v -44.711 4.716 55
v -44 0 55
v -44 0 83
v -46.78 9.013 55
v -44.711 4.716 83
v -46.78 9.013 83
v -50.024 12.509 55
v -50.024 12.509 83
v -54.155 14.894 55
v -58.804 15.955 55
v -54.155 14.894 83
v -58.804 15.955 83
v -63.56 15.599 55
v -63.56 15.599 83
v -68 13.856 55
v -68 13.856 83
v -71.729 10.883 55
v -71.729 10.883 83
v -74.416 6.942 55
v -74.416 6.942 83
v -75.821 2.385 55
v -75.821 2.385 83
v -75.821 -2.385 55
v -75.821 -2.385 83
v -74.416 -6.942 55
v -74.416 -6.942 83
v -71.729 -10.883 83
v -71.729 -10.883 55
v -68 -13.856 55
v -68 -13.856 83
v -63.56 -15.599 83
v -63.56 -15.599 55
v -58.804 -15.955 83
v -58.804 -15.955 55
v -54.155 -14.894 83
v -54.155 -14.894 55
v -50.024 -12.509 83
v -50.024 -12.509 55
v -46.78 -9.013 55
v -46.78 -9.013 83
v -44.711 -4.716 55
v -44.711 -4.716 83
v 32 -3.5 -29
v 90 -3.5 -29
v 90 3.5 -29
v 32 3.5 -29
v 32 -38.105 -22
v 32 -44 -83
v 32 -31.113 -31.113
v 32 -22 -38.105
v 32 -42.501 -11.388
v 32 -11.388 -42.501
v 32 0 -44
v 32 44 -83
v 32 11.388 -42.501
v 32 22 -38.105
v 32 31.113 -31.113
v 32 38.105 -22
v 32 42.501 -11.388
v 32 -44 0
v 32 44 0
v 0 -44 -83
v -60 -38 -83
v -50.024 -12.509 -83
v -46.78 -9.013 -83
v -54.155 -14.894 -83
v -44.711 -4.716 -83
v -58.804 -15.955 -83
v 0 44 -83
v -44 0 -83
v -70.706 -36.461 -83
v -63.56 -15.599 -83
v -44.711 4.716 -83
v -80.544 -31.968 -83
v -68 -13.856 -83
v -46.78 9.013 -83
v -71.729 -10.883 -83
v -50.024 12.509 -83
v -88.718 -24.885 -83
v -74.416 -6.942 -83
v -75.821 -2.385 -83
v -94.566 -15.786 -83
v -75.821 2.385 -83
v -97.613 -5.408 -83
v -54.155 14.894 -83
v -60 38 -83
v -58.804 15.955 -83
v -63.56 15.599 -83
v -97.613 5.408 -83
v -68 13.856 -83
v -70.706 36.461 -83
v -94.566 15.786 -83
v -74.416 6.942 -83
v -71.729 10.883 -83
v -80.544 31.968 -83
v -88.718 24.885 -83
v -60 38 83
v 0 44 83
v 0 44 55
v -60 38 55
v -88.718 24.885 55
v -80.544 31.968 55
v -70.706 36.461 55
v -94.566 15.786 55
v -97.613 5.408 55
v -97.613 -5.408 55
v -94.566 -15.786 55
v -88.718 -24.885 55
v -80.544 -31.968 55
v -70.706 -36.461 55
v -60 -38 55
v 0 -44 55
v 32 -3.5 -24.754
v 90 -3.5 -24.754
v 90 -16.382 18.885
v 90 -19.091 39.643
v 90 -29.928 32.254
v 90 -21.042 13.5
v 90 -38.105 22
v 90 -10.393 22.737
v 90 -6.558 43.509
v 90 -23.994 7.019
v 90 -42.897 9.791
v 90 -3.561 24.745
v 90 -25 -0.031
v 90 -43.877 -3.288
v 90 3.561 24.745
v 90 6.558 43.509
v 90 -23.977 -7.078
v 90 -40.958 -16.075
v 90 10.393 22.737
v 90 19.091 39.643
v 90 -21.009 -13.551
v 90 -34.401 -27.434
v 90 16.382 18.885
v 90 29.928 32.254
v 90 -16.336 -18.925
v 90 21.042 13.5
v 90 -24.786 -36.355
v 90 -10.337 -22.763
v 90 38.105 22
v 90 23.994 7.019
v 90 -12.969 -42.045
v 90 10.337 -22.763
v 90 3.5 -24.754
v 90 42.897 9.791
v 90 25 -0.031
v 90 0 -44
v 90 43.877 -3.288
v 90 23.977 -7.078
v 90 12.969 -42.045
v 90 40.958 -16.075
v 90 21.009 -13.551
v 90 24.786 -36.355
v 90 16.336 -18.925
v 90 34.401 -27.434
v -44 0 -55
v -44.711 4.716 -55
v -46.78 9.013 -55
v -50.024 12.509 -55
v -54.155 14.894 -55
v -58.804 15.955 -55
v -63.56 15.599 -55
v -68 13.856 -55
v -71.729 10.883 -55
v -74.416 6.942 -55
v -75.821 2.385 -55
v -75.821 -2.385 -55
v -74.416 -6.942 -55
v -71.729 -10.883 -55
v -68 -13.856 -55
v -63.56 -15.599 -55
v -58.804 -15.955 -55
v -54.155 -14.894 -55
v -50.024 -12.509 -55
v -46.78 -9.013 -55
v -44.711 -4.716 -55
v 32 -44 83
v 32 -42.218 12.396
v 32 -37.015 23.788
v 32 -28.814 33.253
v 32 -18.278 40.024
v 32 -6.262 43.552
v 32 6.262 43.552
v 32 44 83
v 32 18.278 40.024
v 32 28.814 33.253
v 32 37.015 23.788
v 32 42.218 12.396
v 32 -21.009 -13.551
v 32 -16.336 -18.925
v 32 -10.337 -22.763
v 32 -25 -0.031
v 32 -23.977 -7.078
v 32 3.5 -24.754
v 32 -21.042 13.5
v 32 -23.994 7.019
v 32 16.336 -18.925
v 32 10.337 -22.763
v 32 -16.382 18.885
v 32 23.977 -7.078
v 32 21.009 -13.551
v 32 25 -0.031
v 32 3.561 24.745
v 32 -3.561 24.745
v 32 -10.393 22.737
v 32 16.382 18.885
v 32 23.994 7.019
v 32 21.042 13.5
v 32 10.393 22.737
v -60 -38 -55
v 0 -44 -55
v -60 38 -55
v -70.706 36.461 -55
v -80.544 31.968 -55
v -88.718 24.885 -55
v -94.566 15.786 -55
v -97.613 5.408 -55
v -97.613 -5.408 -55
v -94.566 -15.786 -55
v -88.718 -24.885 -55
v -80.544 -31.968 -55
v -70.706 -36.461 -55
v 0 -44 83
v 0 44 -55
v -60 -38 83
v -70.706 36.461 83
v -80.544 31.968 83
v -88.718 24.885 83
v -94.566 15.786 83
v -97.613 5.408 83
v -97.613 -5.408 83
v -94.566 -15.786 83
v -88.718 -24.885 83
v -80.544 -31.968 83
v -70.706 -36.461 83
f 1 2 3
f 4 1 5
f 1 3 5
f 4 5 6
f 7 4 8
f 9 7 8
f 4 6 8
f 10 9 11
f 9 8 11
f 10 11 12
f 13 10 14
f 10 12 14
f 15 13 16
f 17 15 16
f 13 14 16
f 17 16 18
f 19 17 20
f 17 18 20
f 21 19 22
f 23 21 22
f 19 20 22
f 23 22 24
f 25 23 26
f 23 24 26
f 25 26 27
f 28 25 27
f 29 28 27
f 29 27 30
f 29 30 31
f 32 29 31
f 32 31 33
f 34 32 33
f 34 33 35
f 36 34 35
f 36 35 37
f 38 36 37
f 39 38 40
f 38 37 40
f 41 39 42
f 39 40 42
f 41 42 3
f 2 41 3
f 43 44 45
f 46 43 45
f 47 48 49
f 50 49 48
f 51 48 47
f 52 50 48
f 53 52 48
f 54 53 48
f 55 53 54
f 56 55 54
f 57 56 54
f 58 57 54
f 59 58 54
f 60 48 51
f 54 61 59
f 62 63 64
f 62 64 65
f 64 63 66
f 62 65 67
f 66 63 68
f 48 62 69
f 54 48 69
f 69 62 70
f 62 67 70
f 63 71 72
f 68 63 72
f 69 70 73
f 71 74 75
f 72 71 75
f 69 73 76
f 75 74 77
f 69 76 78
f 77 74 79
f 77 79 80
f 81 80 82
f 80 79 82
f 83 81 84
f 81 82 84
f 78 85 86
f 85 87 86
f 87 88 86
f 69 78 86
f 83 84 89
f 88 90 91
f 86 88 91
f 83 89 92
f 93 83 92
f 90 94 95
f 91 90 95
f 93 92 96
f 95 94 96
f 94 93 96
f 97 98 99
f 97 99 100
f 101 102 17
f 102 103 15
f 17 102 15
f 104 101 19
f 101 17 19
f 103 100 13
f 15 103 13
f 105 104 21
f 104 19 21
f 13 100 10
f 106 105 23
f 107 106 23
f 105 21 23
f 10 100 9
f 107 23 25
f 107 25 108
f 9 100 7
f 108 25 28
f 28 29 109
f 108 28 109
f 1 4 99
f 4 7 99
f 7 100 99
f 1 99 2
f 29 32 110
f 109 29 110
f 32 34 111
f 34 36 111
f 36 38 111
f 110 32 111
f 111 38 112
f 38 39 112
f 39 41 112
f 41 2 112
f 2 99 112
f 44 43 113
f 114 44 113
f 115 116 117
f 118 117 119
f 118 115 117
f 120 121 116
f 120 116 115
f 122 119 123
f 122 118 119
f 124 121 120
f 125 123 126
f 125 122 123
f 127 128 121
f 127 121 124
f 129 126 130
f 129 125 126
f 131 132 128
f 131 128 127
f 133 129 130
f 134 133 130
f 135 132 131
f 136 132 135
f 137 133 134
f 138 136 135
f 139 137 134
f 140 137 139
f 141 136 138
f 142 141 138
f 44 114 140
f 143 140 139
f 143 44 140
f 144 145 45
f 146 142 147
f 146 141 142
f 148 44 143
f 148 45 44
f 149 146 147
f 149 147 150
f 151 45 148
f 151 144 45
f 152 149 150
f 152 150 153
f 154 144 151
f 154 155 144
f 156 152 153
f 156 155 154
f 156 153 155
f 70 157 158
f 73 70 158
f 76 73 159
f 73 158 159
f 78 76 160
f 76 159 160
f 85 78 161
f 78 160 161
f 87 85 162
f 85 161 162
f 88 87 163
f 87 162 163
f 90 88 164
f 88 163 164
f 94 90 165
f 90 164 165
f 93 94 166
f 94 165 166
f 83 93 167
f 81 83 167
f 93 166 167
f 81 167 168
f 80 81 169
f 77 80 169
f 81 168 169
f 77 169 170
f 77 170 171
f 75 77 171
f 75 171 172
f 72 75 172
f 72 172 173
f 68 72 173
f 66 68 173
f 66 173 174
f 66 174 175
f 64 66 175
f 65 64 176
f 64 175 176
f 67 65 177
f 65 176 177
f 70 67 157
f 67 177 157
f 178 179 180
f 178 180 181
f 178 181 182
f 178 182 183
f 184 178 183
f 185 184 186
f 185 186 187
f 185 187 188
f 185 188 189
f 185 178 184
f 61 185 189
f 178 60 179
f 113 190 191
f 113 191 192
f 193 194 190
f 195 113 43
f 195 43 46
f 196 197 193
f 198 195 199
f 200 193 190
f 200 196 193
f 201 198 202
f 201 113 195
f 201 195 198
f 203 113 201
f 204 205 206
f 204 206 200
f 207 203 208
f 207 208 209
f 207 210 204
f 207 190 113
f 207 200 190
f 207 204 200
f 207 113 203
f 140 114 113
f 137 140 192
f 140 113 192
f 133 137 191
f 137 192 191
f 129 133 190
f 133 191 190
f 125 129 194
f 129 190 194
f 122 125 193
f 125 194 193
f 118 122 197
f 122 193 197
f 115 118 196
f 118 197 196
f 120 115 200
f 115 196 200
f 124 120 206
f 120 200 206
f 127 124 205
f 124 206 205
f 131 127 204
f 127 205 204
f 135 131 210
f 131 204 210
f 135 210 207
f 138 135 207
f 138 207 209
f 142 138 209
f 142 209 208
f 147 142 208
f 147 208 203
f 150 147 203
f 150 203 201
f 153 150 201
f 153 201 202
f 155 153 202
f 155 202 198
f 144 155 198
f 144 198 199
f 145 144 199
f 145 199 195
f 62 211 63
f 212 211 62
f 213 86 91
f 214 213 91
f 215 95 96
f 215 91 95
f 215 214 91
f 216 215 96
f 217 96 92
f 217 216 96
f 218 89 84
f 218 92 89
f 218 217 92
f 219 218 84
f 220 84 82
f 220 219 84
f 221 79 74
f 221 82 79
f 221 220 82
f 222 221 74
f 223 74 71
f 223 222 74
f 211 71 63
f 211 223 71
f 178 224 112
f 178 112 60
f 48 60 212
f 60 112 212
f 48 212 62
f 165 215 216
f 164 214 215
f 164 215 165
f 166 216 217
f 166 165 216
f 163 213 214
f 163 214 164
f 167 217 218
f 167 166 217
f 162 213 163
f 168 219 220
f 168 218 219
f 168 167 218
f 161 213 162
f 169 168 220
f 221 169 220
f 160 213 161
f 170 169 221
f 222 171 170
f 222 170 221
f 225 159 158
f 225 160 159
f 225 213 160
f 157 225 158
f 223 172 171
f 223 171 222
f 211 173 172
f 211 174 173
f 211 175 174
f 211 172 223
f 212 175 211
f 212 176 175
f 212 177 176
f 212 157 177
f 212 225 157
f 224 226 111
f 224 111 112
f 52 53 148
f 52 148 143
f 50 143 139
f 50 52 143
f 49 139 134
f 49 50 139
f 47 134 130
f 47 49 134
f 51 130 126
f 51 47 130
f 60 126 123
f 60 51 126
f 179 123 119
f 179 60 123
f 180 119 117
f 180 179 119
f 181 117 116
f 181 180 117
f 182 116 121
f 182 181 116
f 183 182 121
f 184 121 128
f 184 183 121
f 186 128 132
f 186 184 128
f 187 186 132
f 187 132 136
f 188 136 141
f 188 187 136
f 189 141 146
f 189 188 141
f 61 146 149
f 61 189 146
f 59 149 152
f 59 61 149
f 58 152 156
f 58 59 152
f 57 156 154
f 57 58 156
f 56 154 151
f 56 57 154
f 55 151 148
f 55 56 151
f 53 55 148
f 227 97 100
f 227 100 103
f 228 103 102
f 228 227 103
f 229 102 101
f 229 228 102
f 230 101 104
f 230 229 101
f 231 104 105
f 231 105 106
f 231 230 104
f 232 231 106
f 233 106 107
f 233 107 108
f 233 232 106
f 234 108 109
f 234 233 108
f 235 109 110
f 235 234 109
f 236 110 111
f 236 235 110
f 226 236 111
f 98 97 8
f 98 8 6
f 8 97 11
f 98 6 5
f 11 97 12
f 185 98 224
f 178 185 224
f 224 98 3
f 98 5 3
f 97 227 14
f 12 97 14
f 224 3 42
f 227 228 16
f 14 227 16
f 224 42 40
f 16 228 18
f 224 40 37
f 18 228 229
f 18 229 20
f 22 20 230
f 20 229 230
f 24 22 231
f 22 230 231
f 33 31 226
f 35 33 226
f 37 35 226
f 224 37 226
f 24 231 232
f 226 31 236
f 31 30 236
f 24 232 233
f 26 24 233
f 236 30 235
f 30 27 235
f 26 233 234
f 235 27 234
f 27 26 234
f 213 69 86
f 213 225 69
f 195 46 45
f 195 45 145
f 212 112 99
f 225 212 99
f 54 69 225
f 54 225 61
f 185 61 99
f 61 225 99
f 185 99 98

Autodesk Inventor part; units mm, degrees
ref_plane "YZ Plane" through (0, 0, 0) normal (1, 0, 0) x (0, 1, 0)
ref_plane "XZ Plane" through (0, 0, 0) normal (0, 1, 0) x (-1, 0, 0)
ref_plane "XY Plane" through (0, 0, 0) normal (0, 0, 1) x (1, 0, 0)
sketch "Sketch1" plane through (0, 0, 0) normal (1, 0, 0) x (0, 1, 0)
  line L0 (0, 116.2) -> (0, -116.2) projected
  line L1 (-61.6, 0) -> (61.6, 0) projected
  line L2 (44, 83) -> (-44, 83)
  line L3 (-44, 83) -> (-44, -83)
  line L4 (-44, -83) -> (44, -83)
  line L5 (44, -83) -> (44, 83)
  point P0 (0, 0)
  dimension "d0" = 166
  dimension "d1" = 88
extrude "Extrusion1" add sketch "Sketch1" along normal blind 32
sketch "Sketch2" plane through (32, 0, 0) normal (1, 0, 0) x (0, 0, -1)
  line L0 (-116.2, 0) -> (116.2, 0) projected
  line L1 (0, -61.6) -> (0, 61.6) projected
  circle A0 centre (0, 0) radius 44
  arc A1 (24.7538, 3.5) -> (24.7538, -3.5) centre (0, 0) ccw
  line L2 (25, 0) -> (29, 0)
  line L3 (29, 0) -> (29, 3.5)
  line L4 (29, 3.5) -> (24.7538, 3.5)
  arc A2 (24.7538, 3.5) -> (24.7538, -3.5) centre (0, 0) ccw
  line L5 (29, 0) -> (29, -3.5)
  line L6 (29, -3.5) -> (24.7538, -3.5)
  dimension "d4" = 88
  dimension "d5" = 50
  dimension "d6" = 4
  dimension "d7" = 3.5
extrude "Extrusion2" add sketch "Sketch2" along normal blind 58 contours L3 L4 A1 L1 A0 L0 | L0 A0 L1 A1 L6 L5 | A1 L1 A0 L0 | L0 A0 L1 A1
sketch "Sketch3" plane through (0, 0, 0) normal (-1, 0, 0) x (0, 0, 1)
  line L0 (-116.2, 0) -> (116.2, 0) projected
  line L1 (0, 61.6) -> (0, -61.6) projected
  line L2 (-83, 44) -> (83, 44) projected
  line L3 (83, -44) -> (-83, -44) projected
  line L4 (-83, 44) -> (-55, 44)
  line L5 (-55, 44) -> (-55, -44)
  line L6 (-55, -44) -> (-83, -44)
  line L7 (-83, -44) -> (-83, 44)
  line L8 (0, 44) -> (83, 44) projected
  line L9 (83, 44) -> (55, 44)
  line L10 (55, 44) -> (55, -44)
  line L11 (55, -44) -> (83, -44)
  line L12 (83, -44) -> (83, 44)
  point P0 (0, 0)
  dimension "d10" = 28
  dimension "d11" = 28
extrude "Extrusion3" add sketch "Sketch3" along normal blind 98 contours L7 L2 L5 L0 | L0 L5 L3 L7 | L10 L2 L12 L0 | L0 L12 L3 L10
sketch "Sketch4" plane through (32, -44, 83) normal (0, 0, 1) x (1, 0, 0)
  point P0 (-32, 44)
sketch "Sketch5" plane through (32, -44, 83) normal (0, 0, 1) x (1, 0, 0)
  circle A0 centre (-92, 44) radius 38
  line L0 (-92, 6) -> (-32, 0)
  line L1 (-130, 0) -> (0, 0) projected
  line L2 (-32, 88) -> (-32, 0) projected
  line L3 (-32, 88) -> (-92, 82)
  line L4 (0, 88) -> (-130, 88) projected
  line L5 (-32, 88) -> (-130, 88)
  line L6 (-130, 0) -> (-130, 88) projected
  line L7 (-130, 88) -> (-130, 0)
  line L8 (-130, 0) -> (-32, 0)
  point P0 (-32, 44)
  dimension "d14" = 76
extrude "Extrusion4" cut sketch "Sketch5" against normal through all contours A0 L6 L4 L3 | L0 L1 L6 A0
sketch "Sketch6" plane through (32, -44, 83) normal (0, 0, 1) x (1, 0, 0)
  arc A0 (-92, 82) -> (-92, 6) centre (-92, 44) ccw projected
  circle A1 centre (-92, 44) radius 16
  point P0 (-32, 44)
  dimension "d17" = 32
extrude "Extrusion5" cut sketch "Sketch6" against normal through all
properties part number "Fork 2 Off" material "Stainless Steel"
